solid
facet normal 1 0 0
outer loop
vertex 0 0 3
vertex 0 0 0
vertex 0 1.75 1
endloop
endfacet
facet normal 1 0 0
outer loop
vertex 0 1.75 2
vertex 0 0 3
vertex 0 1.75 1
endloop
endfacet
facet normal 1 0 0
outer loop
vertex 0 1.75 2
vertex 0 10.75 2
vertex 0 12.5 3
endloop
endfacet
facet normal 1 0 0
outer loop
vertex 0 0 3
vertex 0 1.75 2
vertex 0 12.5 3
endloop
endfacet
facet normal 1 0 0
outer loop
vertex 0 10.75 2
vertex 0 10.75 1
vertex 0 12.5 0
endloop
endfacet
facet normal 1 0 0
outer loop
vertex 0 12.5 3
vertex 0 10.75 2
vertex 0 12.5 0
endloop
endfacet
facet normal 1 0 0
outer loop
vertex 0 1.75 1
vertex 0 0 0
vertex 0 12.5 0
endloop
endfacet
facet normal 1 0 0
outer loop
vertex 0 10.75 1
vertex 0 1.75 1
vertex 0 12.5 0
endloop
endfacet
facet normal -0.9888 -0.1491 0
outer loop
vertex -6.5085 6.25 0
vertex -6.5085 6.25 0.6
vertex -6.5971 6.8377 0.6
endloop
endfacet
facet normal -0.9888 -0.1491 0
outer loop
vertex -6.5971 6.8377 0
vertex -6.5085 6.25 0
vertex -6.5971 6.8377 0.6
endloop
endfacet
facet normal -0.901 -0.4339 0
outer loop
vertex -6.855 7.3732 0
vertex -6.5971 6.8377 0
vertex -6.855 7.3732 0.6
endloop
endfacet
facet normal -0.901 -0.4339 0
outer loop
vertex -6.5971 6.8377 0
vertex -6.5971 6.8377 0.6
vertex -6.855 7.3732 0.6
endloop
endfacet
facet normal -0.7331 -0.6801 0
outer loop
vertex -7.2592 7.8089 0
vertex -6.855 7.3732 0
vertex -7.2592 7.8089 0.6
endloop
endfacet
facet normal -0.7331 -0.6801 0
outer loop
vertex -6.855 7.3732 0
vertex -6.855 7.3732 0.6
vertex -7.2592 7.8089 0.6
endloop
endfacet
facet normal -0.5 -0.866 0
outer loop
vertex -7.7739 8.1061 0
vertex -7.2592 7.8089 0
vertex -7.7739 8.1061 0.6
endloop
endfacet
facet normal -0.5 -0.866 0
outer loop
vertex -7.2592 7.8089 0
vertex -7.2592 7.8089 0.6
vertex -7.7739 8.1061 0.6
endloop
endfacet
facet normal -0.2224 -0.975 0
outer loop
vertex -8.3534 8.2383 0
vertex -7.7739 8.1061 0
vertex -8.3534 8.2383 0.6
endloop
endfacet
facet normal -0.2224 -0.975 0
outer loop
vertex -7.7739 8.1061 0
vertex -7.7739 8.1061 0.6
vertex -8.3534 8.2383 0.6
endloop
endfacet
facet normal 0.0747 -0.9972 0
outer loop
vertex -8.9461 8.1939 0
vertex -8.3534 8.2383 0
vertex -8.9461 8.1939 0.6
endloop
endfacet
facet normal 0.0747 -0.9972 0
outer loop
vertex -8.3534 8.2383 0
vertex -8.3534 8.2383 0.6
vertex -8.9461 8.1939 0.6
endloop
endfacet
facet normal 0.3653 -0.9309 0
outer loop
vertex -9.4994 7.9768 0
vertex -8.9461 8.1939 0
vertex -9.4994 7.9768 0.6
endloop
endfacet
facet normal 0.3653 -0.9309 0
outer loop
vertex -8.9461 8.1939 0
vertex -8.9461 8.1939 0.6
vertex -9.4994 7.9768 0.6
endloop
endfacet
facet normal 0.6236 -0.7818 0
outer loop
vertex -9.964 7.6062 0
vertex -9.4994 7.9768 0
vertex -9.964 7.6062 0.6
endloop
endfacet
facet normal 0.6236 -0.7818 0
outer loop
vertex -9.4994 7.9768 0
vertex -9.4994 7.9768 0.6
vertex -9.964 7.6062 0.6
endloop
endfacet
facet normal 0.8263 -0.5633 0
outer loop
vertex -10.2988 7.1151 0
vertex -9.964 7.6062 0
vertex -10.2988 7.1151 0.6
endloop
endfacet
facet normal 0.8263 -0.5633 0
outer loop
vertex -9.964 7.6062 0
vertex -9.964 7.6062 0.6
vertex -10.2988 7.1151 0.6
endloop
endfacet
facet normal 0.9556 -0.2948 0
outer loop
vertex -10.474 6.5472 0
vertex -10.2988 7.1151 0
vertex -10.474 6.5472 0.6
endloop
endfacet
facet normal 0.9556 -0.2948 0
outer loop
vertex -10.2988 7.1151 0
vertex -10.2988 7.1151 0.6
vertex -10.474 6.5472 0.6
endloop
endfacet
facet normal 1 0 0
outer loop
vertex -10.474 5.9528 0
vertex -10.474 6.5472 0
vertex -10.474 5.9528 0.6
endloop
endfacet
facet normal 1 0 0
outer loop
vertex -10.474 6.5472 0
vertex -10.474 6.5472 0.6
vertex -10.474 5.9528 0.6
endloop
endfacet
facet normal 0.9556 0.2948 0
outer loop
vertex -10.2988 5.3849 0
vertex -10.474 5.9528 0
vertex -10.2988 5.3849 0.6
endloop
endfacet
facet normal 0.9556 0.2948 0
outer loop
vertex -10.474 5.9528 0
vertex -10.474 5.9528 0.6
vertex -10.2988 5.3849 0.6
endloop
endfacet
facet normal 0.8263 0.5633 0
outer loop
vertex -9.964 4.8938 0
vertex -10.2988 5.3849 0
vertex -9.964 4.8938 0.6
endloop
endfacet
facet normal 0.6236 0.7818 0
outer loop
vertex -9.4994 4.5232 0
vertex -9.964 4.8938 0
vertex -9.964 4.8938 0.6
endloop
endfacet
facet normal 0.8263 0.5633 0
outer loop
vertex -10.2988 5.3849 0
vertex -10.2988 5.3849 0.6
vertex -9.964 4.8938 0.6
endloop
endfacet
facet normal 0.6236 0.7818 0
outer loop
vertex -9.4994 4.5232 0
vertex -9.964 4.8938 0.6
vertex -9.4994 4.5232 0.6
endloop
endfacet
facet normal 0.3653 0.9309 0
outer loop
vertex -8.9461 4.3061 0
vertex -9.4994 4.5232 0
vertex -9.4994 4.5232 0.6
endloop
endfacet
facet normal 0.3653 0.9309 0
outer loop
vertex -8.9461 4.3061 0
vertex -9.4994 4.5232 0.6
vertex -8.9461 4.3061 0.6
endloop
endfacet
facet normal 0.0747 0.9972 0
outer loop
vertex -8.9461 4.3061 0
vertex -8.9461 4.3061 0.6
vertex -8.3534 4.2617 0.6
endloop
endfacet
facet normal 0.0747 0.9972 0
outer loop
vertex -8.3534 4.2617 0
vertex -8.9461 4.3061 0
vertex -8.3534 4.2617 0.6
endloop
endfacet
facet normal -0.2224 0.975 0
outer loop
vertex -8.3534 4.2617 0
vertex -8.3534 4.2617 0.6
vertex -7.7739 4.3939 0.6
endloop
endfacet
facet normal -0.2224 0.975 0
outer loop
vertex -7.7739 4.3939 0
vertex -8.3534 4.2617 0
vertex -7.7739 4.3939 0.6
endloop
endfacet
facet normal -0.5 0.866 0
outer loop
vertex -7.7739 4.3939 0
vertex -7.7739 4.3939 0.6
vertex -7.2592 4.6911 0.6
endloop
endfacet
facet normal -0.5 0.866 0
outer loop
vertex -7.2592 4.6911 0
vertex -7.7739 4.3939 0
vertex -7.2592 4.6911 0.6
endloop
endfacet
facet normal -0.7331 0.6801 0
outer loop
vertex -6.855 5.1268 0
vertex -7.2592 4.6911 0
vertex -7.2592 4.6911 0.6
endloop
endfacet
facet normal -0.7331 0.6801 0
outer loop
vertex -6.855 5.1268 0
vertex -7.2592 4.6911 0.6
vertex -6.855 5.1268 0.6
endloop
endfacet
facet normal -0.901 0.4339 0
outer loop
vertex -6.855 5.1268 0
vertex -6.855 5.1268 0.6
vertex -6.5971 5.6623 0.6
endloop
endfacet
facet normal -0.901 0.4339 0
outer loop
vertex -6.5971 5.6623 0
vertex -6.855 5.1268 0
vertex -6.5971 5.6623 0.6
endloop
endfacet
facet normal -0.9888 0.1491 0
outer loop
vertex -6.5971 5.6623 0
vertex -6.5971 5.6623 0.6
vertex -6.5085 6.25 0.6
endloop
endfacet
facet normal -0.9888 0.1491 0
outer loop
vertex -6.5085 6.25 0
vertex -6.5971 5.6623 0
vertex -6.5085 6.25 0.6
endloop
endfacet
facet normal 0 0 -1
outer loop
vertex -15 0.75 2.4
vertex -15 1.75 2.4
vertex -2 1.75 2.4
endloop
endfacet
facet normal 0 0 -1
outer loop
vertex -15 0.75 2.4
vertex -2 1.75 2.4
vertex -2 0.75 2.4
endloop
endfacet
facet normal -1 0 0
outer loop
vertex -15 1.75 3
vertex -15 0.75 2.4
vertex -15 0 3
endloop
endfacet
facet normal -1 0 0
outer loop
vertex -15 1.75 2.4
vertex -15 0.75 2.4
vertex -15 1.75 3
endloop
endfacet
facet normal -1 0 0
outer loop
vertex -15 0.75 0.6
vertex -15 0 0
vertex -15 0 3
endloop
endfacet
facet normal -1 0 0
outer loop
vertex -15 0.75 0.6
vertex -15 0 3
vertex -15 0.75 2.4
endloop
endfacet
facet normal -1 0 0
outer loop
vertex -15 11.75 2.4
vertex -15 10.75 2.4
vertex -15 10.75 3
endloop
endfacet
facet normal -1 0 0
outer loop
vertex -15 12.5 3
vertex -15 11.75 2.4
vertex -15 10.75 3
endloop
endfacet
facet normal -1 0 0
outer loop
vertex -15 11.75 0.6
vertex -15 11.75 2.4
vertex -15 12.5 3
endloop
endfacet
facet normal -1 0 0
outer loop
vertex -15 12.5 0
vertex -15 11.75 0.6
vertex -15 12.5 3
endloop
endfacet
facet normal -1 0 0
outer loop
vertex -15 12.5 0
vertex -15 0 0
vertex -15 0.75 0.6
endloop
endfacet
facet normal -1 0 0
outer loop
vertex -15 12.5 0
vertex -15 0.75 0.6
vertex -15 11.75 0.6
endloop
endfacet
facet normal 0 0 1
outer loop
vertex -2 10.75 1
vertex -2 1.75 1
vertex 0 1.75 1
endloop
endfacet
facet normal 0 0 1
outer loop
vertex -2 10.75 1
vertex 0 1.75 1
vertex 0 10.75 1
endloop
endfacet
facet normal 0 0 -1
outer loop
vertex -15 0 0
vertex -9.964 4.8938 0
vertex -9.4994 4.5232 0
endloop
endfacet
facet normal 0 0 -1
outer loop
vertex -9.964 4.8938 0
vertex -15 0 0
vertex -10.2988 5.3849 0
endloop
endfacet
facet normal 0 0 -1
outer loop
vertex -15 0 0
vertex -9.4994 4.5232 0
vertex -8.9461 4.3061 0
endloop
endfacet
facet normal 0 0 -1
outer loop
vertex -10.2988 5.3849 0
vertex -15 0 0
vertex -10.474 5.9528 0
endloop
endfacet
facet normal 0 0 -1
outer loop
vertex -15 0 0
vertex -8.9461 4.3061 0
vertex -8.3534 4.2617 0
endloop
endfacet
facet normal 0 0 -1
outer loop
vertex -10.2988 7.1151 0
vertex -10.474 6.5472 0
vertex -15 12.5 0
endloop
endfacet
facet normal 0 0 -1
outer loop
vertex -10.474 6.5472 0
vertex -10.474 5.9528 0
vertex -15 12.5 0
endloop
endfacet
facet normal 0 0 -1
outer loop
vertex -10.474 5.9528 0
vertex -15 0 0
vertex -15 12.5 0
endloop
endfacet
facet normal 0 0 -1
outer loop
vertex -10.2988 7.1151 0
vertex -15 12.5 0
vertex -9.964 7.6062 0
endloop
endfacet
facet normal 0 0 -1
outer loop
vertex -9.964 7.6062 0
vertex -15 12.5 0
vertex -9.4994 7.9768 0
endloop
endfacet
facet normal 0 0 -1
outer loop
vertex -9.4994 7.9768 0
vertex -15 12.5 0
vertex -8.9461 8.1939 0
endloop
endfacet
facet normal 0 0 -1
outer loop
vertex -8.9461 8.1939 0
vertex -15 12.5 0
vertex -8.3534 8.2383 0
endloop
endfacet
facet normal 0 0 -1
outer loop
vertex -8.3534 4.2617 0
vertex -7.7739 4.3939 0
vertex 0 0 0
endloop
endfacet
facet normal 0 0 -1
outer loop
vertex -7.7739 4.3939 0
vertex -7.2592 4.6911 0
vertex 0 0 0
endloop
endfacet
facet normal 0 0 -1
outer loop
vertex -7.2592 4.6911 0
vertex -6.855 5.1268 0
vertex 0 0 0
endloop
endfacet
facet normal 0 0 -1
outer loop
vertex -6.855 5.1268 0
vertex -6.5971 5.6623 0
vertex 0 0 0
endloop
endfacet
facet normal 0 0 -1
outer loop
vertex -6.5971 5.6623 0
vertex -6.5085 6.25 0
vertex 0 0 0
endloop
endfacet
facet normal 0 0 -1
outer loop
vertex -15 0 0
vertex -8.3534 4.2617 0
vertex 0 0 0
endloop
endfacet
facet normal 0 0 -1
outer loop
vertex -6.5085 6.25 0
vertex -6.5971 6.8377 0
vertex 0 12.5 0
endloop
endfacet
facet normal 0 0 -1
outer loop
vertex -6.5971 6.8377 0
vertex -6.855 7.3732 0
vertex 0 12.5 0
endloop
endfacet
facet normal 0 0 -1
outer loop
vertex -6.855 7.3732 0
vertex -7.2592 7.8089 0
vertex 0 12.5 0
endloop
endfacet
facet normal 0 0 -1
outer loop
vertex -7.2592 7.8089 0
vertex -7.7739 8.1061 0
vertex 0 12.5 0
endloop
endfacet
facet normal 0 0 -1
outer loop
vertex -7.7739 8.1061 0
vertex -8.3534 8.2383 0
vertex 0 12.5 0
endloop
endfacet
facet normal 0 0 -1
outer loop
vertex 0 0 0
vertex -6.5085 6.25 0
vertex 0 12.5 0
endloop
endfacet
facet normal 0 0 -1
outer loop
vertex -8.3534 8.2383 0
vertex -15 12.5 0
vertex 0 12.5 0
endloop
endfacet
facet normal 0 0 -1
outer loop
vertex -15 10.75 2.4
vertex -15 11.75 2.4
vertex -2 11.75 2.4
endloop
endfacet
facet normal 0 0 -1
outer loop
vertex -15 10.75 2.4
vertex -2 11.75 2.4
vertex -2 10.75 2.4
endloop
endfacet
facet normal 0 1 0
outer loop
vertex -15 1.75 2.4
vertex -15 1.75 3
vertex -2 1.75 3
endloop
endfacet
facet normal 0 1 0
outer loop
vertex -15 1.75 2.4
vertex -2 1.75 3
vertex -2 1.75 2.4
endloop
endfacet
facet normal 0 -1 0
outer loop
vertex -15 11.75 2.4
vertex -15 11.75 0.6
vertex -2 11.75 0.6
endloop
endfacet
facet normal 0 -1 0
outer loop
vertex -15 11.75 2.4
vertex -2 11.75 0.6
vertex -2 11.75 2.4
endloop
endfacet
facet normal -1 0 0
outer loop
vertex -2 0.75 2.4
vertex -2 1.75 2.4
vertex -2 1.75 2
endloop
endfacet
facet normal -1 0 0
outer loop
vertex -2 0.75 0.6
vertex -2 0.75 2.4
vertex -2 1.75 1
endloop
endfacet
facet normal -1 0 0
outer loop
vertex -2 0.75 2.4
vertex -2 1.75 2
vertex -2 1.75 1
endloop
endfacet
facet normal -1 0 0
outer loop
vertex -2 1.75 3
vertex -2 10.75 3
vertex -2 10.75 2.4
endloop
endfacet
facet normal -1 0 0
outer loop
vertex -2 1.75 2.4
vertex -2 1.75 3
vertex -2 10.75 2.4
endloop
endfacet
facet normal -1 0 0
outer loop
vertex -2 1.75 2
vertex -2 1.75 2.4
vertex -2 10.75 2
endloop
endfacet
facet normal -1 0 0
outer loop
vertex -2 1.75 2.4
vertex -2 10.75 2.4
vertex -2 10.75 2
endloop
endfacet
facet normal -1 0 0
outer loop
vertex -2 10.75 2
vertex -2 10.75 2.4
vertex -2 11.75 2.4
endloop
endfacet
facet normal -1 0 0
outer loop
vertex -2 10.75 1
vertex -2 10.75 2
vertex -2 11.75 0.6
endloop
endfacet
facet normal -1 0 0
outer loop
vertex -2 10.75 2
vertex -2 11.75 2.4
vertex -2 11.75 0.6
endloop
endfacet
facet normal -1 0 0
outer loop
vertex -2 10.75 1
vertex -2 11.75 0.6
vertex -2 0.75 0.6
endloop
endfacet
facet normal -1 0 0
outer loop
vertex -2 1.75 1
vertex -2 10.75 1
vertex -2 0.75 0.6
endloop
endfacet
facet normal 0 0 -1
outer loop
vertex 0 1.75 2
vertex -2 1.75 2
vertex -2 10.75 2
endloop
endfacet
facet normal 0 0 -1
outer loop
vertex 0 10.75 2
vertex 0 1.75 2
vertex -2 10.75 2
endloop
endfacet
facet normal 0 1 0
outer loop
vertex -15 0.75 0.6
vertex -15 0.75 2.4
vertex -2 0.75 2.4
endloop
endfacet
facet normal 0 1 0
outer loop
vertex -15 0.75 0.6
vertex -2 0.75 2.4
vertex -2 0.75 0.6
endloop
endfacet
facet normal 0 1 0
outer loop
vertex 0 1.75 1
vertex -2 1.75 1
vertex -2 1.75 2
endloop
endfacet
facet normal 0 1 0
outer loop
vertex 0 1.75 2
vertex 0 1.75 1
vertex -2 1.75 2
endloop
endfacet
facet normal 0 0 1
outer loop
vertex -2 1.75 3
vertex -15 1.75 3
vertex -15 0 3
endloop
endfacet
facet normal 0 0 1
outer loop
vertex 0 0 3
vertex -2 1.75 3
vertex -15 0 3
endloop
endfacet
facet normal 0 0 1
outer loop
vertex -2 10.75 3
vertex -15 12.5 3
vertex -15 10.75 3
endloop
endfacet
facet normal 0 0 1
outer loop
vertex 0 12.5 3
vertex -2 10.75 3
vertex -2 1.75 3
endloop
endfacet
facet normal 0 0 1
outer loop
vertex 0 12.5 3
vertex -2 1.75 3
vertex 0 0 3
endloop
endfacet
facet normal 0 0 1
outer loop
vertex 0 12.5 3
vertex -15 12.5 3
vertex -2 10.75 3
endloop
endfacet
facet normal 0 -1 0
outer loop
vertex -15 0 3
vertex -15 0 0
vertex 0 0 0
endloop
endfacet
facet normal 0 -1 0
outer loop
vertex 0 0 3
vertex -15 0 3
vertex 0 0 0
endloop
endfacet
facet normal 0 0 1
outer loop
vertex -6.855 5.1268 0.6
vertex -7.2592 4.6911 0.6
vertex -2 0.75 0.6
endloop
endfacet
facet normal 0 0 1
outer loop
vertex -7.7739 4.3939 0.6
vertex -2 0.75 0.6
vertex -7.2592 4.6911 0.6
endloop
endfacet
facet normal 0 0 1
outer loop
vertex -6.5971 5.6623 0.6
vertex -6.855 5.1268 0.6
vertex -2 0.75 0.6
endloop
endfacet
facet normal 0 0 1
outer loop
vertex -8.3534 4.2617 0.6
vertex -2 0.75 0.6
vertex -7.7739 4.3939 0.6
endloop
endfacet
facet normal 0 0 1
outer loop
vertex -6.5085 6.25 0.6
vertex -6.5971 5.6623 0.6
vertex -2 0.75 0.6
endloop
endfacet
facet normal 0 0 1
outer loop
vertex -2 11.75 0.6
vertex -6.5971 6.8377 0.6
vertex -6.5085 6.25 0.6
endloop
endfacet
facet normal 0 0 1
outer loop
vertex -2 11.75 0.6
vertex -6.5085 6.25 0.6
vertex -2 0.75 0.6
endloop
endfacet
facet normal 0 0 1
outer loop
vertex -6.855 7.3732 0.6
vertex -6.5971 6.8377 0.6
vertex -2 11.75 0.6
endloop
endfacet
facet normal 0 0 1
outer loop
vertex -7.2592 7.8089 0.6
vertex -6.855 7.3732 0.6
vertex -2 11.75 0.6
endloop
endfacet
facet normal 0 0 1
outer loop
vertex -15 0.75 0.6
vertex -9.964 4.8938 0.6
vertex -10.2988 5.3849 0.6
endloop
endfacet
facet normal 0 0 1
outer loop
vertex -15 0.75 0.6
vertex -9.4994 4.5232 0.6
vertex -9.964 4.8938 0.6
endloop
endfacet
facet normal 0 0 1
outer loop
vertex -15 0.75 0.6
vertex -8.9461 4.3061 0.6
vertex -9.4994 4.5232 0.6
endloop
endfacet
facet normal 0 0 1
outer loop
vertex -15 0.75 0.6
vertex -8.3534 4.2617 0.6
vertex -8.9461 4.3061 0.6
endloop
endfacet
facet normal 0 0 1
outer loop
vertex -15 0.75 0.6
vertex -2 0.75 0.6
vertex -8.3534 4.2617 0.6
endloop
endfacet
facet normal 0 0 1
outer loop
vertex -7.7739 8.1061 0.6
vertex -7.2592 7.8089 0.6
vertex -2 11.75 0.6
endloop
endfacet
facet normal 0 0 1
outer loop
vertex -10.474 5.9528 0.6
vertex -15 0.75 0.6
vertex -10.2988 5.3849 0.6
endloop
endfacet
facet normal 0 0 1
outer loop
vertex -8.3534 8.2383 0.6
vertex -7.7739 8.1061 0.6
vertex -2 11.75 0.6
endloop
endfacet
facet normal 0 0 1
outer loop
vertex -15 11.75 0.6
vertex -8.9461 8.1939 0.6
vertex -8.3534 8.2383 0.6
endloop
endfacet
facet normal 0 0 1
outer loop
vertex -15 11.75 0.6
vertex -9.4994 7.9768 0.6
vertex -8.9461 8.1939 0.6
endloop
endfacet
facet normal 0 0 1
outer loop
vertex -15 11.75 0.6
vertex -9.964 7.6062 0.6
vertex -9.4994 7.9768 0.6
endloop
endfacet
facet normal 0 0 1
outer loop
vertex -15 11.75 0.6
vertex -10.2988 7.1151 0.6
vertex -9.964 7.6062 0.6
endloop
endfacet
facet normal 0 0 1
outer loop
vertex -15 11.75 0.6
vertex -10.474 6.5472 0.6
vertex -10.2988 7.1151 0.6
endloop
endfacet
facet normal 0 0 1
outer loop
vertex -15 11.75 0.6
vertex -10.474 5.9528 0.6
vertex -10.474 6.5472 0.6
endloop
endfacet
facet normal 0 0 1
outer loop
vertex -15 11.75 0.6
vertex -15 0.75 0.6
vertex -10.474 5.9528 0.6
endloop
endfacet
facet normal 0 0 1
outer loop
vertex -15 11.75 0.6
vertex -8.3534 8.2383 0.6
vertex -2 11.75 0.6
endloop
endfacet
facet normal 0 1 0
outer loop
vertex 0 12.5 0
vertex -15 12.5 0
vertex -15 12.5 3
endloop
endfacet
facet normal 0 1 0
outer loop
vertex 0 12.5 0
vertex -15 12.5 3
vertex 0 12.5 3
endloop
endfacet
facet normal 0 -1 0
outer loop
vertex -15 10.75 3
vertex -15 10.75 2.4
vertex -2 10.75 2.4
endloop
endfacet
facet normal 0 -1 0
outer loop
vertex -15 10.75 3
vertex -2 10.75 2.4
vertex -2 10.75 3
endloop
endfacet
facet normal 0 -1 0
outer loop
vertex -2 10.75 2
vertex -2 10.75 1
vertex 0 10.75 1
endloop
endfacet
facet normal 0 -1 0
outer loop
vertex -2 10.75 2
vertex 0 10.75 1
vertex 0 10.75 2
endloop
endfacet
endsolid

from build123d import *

# Parameters (mm, degrees)
SKETCH1_W           = 15
SKETCH1_H           = 12.5
BOSS_EXTRUDE1_DEPTH = 3
CUT_EXTRUDE1_DEPTH  = 13
SKETCH4_W           = 1
SKETCH4_H           = 9
CUT_EXTRUDE2_DEPTH  = 19.282505299
SKETCH5_R           = 1.9939
CUT_EXTRUDE3_DEPTH  = 1082.289832046


with BuildPart() as part:
    # Sketch1 → Boss-Extrude1 (new body)
    with BuildSketch(Plane.XY):
        with Locations((-7.5, 6.25)):
            Rectangle(SKETCH1_W, SKETCH1_H)
    extrude(amount=BOSS_EXTRUDE1_DEPTH)

    # Sketch3 → Cut-Extrude1 (cut)
    with BuildSketch(Plane.ZY.offset(15)):
        Polygon((0.6, 11.75), (2.4, 11.75), (2.4, 10.75), (3, 10.75), (3, 1.75), (2.4, 1.75), (2.4, 0.75), (0.6, 0.75), align=None)
    extrude(amount=-CUT_EXTRUDE1_DEPTH, mode=Mode.SUBTRACT)

    # Sketch4 → Cut-Extrude2 (cut, through all)
    with BuildSketch(Plane.ZY.offset(2)):
        with Locations((1.5, 6.25)):
            Rectangle(SKETCH4_W, SKETCH4_H)
    extrude(amount=-CUT_EXTRUDE2_DEPTH, mode=Mode.SUBTRACT)

    # Sketch5 → Cut-Extrude3 (cut, through all)
    with BuildSketch(Plane(origin=(-632.3963488, -864.572858382, 0.6), x_dir=(1, 0, 0), z_dir=(0, 0, 1))):
        with Locations((623.8939488, 870.822858382)):
            Circle(SKETCH5_R)
    extrude(amount=-CUT_EXTRUDE3_DEPTH, mode=Mode.SUBTRACT)


solid = part.part
